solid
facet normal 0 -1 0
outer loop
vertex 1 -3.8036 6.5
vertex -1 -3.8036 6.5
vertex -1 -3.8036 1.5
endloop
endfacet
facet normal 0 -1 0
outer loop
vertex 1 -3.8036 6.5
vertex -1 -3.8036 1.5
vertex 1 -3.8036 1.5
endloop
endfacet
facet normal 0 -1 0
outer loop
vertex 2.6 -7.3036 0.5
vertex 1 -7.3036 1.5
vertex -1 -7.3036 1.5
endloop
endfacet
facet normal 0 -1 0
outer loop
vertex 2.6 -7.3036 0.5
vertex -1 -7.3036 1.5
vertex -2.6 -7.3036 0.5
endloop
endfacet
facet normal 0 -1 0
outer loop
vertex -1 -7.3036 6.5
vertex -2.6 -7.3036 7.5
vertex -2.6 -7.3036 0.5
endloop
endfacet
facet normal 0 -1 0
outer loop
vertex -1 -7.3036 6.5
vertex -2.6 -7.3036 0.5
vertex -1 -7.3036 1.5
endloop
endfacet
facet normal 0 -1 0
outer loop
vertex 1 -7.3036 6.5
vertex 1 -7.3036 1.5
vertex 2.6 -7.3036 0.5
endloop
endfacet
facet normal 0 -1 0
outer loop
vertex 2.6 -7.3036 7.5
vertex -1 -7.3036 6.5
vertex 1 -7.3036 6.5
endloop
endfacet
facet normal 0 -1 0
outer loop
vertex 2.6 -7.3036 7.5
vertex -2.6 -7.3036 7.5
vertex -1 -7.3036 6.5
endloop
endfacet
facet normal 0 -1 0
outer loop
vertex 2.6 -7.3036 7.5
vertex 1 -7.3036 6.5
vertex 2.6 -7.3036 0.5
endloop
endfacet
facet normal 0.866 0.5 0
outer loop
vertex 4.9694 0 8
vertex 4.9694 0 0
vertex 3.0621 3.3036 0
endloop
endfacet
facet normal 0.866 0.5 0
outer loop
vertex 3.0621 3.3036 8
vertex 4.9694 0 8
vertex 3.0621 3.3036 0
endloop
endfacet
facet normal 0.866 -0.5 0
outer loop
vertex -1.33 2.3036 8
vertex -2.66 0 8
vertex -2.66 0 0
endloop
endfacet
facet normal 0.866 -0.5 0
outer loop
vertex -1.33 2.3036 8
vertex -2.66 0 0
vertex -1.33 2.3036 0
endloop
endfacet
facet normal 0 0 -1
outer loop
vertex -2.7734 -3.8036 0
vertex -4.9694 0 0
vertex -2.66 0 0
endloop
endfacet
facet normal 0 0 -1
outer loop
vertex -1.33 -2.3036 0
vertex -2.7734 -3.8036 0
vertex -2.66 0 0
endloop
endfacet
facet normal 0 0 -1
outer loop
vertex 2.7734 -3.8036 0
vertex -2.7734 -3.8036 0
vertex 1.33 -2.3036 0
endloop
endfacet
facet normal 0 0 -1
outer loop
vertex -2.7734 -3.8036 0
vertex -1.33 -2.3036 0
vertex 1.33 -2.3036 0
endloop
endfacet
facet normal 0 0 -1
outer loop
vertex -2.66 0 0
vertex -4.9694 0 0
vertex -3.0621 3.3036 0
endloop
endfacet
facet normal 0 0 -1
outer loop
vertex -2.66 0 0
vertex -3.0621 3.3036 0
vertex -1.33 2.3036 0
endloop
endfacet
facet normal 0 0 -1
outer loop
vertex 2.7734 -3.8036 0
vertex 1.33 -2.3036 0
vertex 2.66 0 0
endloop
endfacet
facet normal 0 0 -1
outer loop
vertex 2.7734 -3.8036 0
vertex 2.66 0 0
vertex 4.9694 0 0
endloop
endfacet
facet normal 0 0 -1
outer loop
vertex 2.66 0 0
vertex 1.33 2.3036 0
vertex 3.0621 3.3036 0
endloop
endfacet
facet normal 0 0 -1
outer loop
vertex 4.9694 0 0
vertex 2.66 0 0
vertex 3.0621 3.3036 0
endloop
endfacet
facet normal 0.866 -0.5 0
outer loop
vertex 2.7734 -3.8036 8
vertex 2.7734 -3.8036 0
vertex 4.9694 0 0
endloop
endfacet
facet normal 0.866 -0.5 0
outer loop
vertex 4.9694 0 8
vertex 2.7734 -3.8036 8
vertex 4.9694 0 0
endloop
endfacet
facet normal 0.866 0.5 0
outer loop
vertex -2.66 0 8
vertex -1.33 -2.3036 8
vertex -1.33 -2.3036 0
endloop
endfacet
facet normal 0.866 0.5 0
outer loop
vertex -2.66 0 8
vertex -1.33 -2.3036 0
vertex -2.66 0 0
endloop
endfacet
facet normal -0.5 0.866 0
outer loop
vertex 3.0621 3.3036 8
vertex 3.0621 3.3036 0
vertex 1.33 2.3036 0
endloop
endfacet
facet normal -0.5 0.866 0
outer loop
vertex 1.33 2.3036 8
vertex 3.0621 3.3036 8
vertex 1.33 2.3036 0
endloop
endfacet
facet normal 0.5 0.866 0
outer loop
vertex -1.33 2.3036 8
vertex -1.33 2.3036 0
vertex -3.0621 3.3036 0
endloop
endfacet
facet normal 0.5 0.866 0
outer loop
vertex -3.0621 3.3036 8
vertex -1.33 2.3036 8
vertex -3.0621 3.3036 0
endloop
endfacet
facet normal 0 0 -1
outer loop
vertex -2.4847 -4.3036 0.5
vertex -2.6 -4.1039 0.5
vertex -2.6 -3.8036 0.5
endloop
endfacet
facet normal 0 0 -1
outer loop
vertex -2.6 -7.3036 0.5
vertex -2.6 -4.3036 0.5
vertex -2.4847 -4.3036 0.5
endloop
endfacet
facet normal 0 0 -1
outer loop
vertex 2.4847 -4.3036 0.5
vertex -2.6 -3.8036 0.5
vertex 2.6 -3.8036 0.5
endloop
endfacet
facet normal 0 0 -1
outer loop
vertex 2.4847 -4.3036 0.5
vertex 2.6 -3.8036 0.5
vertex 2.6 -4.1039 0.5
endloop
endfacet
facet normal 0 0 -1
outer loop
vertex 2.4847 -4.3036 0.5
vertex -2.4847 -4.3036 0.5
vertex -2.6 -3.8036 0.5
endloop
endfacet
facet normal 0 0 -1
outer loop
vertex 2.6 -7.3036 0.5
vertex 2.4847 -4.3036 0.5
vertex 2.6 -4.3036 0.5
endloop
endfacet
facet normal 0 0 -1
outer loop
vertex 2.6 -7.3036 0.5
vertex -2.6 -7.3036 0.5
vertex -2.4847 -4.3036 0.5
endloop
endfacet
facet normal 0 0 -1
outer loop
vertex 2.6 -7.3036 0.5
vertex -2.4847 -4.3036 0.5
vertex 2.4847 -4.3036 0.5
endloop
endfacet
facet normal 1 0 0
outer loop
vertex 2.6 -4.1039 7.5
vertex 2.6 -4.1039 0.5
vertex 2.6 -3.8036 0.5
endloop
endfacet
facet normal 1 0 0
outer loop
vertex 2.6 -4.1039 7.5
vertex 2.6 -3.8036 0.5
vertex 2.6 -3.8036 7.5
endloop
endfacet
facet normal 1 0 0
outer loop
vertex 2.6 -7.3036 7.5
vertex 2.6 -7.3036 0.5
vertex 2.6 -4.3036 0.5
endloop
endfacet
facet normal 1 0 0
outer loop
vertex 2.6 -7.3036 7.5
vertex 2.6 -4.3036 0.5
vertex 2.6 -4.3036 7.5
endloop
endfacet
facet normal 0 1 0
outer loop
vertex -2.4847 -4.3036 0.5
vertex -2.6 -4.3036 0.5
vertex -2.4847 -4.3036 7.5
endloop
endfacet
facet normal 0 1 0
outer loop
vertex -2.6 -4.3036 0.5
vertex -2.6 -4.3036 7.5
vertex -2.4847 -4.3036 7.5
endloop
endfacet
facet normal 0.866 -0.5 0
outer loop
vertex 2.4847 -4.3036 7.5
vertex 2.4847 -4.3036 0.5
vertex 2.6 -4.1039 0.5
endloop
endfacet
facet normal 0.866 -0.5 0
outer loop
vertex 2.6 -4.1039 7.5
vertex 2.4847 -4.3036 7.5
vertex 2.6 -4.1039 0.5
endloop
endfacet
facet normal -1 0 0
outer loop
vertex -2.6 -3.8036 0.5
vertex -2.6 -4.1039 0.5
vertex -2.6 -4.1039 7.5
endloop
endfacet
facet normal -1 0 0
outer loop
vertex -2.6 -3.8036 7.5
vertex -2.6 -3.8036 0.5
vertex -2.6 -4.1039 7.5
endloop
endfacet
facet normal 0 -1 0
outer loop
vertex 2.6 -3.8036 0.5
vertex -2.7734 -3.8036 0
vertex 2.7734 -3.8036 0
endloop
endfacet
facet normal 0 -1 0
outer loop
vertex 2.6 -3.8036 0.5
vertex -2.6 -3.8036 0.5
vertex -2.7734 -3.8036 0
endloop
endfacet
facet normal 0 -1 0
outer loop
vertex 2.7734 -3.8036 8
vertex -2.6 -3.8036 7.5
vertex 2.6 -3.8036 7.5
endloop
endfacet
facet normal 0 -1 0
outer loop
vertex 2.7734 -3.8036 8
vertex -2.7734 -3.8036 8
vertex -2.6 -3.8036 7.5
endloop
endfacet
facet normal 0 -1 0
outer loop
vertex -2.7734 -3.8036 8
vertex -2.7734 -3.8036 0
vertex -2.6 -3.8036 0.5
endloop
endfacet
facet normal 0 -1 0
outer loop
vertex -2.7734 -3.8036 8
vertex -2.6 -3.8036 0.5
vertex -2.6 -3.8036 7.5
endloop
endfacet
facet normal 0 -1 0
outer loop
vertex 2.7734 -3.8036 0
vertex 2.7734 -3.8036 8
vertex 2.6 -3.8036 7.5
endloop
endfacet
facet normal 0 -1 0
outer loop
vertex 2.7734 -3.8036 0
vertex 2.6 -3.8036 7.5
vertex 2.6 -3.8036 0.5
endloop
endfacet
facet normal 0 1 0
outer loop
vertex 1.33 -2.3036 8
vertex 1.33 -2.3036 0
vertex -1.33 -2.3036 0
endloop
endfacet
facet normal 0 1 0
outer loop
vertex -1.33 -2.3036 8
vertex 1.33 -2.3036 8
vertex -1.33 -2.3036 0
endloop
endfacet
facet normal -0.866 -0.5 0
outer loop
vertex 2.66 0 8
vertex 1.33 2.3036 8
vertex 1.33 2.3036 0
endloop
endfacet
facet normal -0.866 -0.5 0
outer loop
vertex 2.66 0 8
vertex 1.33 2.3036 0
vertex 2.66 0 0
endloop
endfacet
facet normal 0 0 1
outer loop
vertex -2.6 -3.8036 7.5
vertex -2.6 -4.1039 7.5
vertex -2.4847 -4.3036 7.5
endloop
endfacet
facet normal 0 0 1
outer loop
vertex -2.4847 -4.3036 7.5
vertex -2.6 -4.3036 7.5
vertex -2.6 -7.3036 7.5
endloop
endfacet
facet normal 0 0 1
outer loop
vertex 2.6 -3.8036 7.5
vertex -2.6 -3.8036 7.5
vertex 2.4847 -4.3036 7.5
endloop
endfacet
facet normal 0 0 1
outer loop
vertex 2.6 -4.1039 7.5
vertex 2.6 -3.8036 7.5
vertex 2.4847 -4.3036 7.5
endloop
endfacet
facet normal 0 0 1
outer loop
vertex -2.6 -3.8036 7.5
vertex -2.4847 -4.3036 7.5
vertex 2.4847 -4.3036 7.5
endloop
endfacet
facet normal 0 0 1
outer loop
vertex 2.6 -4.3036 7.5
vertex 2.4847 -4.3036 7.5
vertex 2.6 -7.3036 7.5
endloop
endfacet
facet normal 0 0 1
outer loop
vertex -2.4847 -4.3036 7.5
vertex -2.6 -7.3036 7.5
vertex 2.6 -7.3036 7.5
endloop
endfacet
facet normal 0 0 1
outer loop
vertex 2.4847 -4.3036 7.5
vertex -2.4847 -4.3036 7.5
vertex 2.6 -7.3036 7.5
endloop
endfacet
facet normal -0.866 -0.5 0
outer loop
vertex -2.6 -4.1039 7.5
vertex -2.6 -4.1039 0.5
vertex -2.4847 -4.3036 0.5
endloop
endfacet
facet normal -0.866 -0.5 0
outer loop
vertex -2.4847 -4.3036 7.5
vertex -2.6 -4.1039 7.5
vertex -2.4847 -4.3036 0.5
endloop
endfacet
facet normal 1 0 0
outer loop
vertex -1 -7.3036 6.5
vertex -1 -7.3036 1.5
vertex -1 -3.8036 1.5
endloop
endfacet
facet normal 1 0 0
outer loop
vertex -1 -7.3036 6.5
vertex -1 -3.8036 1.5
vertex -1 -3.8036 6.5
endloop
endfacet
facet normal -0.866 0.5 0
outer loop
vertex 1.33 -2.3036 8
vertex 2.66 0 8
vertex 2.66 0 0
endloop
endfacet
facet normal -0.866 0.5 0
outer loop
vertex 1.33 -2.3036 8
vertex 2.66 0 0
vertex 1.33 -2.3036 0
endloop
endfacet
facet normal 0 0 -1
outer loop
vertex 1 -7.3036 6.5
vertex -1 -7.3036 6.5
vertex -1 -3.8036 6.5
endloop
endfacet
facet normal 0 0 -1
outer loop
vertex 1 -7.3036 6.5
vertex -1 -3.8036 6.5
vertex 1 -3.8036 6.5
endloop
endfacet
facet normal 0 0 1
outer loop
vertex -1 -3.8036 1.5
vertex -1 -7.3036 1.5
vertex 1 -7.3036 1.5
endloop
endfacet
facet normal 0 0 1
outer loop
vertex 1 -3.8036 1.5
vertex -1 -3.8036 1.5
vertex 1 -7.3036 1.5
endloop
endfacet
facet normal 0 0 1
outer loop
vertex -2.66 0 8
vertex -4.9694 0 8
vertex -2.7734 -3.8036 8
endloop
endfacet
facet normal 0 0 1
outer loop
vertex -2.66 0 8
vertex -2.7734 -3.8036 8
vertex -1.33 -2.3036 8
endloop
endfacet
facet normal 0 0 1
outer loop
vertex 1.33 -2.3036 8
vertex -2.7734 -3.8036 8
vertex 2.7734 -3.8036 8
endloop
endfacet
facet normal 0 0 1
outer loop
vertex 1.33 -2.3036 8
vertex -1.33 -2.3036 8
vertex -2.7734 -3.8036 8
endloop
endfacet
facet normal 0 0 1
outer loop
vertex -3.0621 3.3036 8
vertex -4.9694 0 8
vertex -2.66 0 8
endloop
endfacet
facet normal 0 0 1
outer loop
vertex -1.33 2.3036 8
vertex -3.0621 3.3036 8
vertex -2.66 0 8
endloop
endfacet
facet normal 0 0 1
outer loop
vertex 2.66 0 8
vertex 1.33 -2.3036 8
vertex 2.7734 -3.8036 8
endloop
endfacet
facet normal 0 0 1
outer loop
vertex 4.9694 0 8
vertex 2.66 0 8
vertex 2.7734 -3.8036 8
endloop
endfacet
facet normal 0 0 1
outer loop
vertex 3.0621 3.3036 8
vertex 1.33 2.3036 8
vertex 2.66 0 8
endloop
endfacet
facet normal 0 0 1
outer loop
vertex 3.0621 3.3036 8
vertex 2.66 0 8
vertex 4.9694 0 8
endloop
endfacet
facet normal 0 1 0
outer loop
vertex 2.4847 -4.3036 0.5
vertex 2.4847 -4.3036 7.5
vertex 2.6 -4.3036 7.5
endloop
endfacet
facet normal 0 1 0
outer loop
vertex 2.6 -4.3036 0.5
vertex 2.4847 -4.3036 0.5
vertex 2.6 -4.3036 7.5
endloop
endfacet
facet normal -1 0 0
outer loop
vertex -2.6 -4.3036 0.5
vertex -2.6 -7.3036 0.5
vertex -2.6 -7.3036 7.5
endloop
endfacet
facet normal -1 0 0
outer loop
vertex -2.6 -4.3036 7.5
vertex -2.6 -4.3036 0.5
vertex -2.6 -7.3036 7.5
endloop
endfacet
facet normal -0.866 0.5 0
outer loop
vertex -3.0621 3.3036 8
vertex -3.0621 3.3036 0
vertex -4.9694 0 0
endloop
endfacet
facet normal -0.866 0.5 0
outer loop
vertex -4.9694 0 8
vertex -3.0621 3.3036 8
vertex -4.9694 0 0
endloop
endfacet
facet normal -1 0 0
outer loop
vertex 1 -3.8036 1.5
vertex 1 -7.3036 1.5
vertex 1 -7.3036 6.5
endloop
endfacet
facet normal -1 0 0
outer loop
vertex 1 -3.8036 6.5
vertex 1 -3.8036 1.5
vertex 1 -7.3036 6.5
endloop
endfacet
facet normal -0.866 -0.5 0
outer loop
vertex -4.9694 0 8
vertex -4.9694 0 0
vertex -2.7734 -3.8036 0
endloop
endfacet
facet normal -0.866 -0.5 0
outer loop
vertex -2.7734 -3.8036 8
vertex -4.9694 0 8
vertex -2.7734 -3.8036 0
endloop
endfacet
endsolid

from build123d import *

# Parameters (mm, degrees)
EXTRUDE_1_DEPTH      = 8
SKETCH_2_W           = 9
SKETCH_2_H           = 8
EXTRUDE_2_DEPTH      = 3
SKETCH_3_OUTSIDE_W   = 15.256
SKETCH_3_OUTSIDE_H   = 13.318
SKETCH_3_OUTSIDE_W_2 = 5.2
SKETCH_3_OUTSIDE_H_2 = 7
SKETCH_3_OUTSIDE_W_3 = 2
SKETCH_3_OUTSIDE_H_3 = 5
CUT_EXTRUDE_1_DEPTH  = 3.5


with BuildPart() as part:
    # 草图1 → 凸台-拉伸1 (new body)
    with BuildSketch(Plane.XY):
        Polygon((-3.062050808, 3.303627574), (-4.969401077, 0), (-2.484700538, -4.303627574), (2.484700538, -4.303627574), (4.969401077, 0), (3.062050808, 3.303627574), (1.33, 2.303627574), (2.66, 0), (1.33, -2.303627574), (-1.33, -2.303627574), (-2.66, 0), (-1.33, 2.303627574), align=None)
    extrude(amount=EXTRUDE_1_DEPTH)

    # 草图2 → 凸台-拉伸2 (add)
    with BuildSketch(Plane.XZ.offset(4.303627574)):
        with Locations((0, 4)):
            Rectangle(SKETCH_2_W, SKETCH_2_H)
    extrude(amount=EXTRUDE_2_DEPTH)

    # 草图3 outside → 切除-拉伸1 (cut)
    # profile 1 of 2: a face of its own
    with BuildSketch(Plane.XZ.offset(7.303627574)):
        with Locations((0, 4)):
            Rectangle(SKETCH_3_OUTSIDE_W, SKETCH_3_OUTSIDE_H)
        with Locations((0, 4)):
            Rectangle(SKETCH_3_OUTSIDE_W_2, SKETCH_3_OUTSIDE_H_2, mode=Mode.SUBTRACT)
    # profile 2 of 2: a face of its own
    with BuildSketch(Plane.XZ.offset(7.303627574)):
        with Locations((0, 4)):
            Rectangle(SKETCH_3_OUTSIDE_W_3, SKETCH_3_OUTSIDE_H_3)
    extrude(amount=-CUT_EXTRUDE_1_DEPTH, mode=Mode.SUBTRACT)


solid = part.part
